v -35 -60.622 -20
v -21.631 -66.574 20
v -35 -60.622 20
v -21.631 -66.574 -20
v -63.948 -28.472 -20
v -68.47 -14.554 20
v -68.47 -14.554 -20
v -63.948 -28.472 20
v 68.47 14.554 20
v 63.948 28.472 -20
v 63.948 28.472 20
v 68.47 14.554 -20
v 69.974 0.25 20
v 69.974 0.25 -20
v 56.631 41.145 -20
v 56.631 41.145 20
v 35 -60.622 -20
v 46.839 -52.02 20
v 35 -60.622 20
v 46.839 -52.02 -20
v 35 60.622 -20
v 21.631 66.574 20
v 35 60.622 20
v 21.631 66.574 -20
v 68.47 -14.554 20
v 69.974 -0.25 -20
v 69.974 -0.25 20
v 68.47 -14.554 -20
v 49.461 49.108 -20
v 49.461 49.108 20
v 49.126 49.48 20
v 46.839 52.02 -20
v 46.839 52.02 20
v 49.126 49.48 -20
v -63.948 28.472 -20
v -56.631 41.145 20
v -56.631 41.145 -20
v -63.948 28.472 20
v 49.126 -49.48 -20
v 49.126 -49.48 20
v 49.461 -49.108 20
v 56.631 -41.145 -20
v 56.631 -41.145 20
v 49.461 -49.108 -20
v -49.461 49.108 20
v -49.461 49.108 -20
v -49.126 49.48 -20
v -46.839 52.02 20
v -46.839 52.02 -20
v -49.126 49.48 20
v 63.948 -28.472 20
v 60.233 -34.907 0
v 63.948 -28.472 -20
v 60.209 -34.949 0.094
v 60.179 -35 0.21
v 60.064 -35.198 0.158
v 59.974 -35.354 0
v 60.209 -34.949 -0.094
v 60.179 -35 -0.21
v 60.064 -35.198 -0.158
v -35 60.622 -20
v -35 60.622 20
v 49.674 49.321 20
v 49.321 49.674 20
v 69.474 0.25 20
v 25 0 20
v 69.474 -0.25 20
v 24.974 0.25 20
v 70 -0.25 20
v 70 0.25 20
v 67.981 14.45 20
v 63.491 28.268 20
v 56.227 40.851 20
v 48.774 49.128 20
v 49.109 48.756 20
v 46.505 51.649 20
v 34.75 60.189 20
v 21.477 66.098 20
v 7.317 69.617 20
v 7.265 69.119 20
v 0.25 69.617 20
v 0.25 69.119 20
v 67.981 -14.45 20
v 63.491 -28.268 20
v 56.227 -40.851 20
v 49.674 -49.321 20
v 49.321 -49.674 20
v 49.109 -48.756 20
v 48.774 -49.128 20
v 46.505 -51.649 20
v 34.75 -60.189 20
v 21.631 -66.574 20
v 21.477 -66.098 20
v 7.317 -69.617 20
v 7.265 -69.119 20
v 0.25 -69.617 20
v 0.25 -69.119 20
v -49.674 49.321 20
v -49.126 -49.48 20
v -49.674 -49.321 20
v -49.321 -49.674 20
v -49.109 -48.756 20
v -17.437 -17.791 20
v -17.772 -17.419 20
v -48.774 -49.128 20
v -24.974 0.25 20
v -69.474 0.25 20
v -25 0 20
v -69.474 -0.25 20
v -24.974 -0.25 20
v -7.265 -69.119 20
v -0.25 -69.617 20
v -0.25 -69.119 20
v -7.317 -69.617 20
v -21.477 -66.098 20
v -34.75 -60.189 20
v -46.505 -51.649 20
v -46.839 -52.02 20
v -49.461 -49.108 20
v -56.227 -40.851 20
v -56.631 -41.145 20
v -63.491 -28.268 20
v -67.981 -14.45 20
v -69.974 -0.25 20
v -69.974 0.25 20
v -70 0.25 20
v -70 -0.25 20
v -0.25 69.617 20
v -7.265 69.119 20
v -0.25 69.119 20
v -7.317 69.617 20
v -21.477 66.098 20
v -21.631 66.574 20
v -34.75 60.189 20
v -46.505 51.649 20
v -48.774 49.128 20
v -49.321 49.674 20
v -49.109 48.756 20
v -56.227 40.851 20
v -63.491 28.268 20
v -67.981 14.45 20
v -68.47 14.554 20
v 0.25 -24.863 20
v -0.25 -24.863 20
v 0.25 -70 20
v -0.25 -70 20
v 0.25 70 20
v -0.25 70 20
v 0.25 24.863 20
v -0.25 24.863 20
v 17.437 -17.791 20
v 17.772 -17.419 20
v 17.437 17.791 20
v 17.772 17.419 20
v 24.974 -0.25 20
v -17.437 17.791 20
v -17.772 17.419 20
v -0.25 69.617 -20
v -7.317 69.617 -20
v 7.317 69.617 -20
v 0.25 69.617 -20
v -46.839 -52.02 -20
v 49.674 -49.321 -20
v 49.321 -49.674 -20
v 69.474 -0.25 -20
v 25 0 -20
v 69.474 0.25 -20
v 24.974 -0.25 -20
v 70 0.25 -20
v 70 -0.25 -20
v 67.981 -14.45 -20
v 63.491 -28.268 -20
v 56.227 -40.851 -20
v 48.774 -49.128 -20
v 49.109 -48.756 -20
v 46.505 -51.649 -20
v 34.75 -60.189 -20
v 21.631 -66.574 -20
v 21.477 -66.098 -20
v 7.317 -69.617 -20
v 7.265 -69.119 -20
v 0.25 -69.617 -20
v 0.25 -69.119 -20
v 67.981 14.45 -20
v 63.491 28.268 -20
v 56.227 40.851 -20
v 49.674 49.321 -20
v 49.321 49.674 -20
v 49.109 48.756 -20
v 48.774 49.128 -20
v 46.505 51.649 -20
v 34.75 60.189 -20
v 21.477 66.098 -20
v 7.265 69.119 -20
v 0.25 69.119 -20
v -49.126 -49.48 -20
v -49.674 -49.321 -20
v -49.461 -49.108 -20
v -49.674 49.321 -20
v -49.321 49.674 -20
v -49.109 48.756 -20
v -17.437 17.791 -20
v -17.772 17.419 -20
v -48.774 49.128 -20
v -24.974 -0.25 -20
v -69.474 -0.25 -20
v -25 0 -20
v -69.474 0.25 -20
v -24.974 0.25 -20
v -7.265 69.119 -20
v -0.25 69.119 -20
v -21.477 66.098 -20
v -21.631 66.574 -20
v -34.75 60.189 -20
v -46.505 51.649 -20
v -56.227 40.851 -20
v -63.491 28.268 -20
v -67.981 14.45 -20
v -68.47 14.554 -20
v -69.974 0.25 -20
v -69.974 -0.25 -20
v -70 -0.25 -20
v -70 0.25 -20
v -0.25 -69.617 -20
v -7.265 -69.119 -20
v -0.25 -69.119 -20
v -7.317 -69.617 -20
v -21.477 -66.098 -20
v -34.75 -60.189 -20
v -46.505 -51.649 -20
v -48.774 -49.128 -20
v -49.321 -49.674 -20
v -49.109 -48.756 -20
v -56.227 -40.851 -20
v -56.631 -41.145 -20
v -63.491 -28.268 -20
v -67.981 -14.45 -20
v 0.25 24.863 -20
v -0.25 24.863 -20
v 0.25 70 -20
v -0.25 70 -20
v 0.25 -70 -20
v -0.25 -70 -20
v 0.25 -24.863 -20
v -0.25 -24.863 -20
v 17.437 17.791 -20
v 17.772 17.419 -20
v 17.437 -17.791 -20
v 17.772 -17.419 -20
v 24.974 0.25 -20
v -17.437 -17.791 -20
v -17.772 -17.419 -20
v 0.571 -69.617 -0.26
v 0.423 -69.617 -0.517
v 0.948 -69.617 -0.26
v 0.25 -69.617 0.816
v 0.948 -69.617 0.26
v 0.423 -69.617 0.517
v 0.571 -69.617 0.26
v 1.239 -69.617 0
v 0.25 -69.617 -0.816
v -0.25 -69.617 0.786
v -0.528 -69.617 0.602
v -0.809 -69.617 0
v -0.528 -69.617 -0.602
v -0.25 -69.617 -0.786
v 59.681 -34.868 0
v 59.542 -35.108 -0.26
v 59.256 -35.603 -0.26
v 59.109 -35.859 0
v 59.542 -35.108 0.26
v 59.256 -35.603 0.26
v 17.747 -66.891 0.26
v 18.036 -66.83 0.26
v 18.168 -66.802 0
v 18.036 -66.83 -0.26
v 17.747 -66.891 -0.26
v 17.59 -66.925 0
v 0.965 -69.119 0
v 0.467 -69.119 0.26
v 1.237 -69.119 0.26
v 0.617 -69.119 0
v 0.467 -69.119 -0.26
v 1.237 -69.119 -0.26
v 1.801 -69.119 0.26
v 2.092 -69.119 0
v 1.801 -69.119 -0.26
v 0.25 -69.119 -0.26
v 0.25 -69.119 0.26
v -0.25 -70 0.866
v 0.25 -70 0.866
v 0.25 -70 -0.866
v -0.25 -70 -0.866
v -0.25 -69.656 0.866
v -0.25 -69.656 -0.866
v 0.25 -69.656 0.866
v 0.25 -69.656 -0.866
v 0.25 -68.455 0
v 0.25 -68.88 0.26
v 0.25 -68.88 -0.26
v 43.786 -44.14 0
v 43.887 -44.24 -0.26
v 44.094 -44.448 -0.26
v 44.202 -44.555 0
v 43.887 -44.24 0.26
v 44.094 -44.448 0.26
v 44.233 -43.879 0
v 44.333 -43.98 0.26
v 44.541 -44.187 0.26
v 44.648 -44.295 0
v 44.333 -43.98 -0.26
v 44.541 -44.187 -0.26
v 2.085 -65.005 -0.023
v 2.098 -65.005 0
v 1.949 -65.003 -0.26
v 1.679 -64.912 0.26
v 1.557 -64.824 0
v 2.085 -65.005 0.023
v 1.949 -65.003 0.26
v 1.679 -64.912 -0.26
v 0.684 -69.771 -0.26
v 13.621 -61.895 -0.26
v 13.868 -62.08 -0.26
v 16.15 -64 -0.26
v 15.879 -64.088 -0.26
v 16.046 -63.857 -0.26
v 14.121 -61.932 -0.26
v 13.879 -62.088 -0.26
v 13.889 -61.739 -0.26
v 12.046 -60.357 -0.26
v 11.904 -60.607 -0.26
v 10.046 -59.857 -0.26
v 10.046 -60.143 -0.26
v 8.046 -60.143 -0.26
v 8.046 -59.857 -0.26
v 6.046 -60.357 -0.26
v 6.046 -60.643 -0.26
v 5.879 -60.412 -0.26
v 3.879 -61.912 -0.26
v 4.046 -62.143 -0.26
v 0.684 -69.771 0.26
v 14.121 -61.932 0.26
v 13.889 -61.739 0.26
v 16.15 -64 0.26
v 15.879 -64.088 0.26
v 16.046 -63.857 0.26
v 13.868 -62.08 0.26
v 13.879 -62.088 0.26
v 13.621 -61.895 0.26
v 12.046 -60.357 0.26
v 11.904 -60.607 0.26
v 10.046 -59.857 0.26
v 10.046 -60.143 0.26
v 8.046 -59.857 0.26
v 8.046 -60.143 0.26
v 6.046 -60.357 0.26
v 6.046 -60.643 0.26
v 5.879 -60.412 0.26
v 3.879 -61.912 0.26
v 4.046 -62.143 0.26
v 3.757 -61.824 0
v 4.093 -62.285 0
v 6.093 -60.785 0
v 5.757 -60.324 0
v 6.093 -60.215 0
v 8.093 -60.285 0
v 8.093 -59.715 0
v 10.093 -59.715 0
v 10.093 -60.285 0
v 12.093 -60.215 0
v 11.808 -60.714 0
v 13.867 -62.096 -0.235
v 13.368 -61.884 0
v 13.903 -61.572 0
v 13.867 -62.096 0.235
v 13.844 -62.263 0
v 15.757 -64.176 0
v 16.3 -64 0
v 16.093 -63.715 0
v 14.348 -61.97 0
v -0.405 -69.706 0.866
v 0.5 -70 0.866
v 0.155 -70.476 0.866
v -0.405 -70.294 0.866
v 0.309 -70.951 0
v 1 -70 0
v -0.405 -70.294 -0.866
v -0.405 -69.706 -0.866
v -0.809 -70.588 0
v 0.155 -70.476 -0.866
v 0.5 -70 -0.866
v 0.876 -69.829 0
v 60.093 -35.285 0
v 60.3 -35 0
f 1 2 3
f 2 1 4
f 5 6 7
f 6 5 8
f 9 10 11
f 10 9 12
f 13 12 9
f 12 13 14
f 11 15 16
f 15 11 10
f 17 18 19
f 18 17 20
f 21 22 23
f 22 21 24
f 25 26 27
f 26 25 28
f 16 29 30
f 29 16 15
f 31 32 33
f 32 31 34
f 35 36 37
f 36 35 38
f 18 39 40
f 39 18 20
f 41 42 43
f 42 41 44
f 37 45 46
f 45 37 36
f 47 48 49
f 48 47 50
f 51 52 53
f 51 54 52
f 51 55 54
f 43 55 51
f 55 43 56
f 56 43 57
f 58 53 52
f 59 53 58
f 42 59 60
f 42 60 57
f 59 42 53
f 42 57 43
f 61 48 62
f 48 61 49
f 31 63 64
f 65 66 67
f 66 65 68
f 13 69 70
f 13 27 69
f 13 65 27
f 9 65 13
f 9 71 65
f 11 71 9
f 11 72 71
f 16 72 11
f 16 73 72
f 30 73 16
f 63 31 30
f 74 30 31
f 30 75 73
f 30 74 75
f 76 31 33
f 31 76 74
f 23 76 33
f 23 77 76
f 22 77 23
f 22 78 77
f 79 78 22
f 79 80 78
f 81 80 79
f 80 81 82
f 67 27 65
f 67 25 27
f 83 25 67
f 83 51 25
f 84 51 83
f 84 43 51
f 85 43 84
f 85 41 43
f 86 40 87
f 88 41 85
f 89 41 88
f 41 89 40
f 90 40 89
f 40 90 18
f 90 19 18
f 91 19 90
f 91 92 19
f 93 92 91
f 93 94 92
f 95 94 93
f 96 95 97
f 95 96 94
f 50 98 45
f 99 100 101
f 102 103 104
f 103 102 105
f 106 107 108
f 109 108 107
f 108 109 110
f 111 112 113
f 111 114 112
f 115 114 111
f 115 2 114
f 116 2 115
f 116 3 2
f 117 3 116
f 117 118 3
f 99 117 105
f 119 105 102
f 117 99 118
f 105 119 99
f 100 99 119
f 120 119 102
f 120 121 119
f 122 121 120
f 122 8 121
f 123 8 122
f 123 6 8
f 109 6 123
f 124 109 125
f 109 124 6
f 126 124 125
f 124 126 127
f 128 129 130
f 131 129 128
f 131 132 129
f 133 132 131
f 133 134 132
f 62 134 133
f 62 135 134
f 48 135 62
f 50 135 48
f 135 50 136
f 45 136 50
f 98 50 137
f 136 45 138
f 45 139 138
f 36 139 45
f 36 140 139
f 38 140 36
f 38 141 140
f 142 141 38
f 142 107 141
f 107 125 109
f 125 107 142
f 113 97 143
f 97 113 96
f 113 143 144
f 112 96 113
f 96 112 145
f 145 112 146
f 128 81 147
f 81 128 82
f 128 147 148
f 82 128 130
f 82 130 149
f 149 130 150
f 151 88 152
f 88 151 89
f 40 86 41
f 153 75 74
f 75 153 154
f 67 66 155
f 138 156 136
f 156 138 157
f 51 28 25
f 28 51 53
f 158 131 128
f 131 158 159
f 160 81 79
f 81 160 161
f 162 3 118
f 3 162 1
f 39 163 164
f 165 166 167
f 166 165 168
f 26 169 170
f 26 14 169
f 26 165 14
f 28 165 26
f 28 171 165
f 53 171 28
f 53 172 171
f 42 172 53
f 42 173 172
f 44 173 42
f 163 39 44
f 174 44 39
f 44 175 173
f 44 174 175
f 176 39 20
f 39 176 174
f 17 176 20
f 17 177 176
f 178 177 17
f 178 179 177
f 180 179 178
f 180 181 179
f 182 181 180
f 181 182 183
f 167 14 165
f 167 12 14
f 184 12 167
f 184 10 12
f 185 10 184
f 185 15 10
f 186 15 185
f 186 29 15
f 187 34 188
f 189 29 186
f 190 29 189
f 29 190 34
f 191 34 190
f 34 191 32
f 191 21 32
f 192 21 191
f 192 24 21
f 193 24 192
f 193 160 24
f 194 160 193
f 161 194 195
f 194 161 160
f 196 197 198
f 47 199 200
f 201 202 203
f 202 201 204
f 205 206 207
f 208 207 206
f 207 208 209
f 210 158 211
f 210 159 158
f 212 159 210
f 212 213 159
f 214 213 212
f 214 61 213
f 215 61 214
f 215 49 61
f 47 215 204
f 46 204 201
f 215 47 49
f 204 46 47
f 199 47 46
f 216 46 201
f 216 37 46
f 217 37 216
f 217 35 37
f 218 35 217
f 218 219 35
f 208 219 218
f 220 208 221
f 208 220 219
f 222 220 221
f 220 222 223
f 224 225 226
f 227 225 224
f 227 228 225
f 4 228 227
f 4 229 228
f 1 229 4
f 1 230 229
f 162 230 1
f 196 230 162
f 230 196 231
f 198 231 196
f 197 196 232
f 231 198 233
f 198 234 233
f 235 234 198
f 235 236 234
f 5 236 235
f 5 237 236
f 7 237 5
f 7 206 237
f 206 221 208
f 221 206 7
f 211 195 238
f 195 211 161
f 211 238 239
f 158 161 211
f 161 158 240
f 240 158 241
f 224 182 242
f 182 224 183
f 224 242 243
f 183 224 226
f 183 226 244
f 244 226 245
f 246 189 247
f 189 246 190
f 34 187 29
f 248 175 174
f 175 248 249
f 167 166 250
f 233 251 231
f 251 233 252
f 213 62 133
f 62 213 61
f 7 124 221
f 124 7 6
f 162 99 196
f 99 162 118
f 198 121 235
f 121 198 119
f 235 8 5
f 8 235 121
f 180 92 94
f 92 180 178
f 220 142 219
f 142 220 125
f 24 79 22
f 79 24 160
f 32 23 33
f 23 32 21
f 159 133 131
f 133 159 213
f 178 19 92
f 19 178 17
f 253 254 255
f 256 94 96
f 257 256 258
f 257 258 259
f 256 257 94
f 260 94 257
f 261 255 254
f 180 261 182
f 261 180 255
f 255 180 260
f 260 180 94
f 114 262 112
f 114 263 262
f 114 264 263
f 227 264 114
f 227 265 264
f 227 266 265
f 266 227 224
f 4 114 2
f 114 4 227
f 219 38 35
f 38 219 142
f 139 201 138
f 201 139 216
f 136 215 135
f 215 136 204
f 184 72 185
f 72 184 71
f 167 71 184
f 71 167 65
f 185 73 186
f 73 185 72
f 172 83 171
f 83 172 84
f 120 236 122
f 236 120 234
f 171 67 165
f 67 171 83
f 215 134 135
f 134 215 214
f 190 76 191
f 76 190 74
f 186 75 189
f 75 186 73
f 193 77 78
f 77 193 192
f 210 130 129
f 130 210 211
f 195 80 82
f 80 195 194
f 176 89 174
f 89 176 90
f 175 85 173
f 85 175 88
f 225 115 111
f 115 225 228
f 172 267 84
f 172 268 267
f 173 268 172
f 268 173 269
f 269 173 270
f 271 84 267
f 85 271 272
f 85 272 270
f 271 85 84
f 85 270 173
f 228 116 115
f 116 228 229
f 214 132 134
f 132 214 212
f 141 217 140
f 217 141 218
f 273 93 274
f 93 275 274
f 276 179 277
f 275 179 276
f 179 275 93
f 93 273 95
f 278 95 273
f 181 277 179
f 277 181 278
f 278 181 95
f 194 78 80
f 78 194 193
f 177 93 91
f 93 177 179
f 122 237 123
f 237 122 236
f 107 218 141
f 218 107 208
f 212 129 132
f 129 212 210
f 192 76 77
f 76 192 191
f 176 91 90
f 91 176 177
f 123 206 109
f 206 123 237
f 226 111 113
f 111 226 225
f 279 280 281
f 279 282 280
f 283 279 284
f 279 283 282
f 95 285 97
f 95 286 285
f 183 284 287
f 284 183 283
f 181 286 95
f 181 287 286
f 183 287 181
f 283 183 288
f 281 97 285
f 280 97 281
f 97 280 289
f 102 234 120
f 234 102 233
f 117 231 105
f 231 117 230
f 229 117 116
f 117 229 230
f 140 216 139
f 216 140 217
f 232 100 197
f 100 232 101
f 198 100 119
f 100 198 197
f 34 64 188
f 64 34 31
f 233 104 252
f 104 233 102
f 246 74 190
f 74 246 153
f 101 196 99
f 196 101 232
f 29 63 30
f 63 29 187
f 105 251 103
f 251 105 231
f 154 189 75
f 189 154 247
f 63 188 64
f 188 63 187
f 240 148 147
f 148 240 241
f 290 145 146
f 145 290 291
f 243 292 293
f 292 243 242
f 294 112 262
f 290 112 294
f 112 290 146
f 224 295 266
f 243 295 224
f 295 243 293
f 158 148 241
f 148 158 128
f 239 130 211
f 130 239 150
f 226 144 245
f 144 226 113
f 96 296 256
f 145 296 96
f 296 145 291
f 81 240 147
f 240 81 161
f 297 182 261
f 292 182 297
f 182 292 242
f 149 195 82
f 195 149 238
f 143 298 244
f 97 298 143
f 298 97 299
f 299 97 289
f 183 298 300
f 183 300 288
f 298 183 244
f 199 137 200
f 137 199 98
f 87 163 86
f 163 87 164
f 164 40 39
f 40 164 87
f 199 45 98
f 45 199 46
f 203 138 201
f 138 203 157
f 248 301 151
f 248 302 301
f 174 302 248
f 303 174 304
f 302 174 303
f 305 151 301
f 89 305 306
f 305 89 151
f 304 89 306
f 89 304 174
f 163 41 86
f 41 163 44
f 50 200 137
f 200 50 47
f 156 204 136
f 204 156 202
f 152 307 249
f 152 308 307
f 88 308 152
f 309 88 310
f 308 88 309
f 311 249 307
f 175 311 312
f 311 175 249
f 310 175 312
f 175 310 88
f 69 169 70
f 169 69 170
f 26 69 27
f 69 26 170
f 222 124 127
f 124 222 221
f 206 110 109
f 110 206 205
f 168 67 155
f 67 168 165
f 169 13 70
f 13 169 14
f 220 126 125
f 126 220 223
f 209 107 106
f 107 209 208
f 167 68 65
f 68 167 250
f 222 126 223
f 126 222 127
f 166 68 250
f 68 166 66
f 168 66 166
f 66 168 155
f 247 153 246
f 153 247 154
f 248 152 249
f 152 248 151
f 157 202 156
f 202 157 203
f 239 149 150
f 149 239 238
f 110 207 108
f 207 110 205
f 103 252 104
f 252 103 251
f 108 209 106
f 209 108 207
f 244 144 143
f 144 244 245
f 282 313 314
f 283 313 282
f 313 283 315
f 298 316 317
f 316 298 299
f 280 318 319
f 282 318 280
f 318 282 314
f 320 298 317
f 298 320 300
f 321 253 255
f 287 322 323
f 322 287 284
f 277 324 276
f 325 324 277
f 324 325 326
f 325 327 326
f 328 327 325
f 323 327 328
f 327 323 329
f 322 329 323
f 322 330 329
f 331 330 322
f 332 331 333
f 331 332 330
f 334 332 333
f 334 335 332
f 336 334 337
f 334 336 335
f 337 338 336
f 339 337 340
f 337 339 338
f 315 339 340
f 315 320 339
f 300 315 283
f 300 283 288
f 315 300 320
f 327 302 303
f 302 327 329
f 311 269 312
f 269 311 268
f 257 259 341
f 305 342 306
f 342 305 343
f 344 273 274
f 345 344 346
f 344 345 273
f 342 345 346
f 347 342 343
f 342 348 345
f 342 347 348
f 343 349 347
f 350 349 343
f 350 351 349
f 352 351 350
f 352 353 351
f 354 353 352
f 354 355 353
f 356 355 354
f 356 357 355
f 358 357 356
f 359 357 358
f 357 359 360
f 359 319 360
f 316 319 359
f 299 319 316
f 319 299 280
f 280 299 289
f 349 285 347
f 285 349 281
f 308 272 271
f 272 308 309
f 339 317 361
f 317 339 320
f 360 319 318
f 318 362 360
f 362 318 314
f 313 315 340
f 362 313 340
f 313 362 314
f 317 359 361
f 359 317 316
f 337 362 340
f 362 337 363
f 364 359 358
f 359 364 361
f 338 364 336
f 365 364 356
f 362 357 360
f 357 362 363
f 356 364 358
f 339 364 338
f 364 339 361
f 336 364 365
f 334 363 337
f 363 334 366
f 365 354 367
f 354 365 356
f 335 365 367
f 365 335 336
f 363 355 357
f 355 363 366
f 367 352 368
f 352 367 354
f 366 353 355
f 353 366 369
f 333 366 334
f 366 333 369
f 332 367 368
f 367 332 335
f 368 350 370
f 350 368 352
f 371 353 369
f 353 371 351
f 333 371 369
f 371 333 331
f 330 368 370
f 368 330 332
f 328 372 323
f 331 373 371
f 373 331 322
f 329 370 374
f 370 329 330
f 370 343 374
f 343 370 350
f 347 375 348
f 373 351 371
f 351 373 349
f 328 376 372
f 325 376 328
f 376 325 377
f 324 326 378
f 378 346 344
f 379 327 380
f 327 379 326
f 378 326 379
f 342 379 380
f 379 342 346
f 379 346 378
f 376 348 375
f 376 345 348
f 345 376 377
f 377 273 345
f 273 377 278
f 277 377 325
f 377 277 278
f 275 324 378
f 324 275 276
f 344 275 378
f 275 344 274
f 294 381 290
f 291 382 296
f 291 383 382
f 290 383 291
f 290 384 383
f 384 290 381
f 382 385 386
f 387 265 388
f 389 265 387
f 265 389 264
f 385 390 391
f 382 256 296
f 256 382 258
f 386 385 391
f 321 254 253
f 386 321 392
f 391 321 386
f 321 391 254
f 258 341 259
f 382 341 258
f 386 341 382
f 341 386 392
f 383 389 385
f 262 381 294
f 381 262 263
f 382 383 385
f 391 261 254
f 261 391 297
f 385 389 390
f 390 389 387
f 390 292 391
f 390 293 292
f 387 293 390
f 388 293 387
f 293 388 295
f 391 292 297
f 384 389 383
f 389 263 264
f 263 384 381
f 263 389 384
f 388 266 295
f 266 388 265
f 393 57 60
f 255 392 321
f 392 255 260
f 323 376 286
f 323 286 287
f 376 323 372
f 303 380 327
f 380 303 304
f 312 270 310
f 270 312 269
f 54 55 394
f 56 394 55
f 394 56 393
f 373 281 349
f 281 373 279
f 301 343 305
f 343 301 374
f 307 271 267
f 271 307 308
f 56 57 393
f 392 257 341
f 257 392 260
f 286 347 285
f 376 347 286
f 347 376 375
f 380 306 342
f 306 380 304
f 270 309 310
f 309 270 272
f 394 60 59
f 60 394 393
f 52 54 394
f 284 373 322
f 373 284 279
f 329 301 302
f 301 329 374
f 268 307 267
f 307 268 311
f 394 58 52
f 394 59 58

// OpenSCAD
//$fn=64;

module station(){
difference(){
    cylinder(h=40,r=70,center=true);
    cylinder(h=41,r=69.5,center=true);
}/*
difference(){
    cylinder(h=40,r=55,center=true);
    cylinder(h=41,r=54.5,center=true);
}
difference(){
    cylinder(h=40,r=40,center=true);
    cylinder(h=41,r=39.5,center=true);
}
difference(){
    cylinder(h=40,r=25,center=true);
    cylinder(h=41,r=24.5,center=true);
}*/
difference(){
union(){
for(a=[45:45:180]){
    rotate([0,0,a]){
    cube([140,0.5,40],true);
    }
}
}
cylinder(h=41,r=25,center=true);
}

arrow=[
    [0,-70,0],
    [1.8,-65,0],
    [4,-62,0],
    [6,-60.5,0],
    [8,-60,0],
    [10,-60,0],
    [12,-60.5,0],
    [14,-62,0],
    [16,-64,0],
    [18,-67,0]
];
at=0.3;

color("#0F0"){
for(i=[1:1:len(arrow)-1]){
    hull(){
        translate(arrow[i-1]){sphere(at);}
        translate(arrow[i]){sphere(at);}
    }
}
}

}

station_rt=[0,0,45*$t];
rotate(station_rt){
    station();
}

ball_tr=[(60*$t),(35*$t)-70,0];

translate(ball_tr){
    sphere();
}


//trajectory
color("#F00"){
hull(){
    translate([0,-70,0]){sphere(0.3);}
    translate([60,35-70,0]){sphere(0.3);}
}
}

$vpt=ball_tr;
$vpr=station_rt;
